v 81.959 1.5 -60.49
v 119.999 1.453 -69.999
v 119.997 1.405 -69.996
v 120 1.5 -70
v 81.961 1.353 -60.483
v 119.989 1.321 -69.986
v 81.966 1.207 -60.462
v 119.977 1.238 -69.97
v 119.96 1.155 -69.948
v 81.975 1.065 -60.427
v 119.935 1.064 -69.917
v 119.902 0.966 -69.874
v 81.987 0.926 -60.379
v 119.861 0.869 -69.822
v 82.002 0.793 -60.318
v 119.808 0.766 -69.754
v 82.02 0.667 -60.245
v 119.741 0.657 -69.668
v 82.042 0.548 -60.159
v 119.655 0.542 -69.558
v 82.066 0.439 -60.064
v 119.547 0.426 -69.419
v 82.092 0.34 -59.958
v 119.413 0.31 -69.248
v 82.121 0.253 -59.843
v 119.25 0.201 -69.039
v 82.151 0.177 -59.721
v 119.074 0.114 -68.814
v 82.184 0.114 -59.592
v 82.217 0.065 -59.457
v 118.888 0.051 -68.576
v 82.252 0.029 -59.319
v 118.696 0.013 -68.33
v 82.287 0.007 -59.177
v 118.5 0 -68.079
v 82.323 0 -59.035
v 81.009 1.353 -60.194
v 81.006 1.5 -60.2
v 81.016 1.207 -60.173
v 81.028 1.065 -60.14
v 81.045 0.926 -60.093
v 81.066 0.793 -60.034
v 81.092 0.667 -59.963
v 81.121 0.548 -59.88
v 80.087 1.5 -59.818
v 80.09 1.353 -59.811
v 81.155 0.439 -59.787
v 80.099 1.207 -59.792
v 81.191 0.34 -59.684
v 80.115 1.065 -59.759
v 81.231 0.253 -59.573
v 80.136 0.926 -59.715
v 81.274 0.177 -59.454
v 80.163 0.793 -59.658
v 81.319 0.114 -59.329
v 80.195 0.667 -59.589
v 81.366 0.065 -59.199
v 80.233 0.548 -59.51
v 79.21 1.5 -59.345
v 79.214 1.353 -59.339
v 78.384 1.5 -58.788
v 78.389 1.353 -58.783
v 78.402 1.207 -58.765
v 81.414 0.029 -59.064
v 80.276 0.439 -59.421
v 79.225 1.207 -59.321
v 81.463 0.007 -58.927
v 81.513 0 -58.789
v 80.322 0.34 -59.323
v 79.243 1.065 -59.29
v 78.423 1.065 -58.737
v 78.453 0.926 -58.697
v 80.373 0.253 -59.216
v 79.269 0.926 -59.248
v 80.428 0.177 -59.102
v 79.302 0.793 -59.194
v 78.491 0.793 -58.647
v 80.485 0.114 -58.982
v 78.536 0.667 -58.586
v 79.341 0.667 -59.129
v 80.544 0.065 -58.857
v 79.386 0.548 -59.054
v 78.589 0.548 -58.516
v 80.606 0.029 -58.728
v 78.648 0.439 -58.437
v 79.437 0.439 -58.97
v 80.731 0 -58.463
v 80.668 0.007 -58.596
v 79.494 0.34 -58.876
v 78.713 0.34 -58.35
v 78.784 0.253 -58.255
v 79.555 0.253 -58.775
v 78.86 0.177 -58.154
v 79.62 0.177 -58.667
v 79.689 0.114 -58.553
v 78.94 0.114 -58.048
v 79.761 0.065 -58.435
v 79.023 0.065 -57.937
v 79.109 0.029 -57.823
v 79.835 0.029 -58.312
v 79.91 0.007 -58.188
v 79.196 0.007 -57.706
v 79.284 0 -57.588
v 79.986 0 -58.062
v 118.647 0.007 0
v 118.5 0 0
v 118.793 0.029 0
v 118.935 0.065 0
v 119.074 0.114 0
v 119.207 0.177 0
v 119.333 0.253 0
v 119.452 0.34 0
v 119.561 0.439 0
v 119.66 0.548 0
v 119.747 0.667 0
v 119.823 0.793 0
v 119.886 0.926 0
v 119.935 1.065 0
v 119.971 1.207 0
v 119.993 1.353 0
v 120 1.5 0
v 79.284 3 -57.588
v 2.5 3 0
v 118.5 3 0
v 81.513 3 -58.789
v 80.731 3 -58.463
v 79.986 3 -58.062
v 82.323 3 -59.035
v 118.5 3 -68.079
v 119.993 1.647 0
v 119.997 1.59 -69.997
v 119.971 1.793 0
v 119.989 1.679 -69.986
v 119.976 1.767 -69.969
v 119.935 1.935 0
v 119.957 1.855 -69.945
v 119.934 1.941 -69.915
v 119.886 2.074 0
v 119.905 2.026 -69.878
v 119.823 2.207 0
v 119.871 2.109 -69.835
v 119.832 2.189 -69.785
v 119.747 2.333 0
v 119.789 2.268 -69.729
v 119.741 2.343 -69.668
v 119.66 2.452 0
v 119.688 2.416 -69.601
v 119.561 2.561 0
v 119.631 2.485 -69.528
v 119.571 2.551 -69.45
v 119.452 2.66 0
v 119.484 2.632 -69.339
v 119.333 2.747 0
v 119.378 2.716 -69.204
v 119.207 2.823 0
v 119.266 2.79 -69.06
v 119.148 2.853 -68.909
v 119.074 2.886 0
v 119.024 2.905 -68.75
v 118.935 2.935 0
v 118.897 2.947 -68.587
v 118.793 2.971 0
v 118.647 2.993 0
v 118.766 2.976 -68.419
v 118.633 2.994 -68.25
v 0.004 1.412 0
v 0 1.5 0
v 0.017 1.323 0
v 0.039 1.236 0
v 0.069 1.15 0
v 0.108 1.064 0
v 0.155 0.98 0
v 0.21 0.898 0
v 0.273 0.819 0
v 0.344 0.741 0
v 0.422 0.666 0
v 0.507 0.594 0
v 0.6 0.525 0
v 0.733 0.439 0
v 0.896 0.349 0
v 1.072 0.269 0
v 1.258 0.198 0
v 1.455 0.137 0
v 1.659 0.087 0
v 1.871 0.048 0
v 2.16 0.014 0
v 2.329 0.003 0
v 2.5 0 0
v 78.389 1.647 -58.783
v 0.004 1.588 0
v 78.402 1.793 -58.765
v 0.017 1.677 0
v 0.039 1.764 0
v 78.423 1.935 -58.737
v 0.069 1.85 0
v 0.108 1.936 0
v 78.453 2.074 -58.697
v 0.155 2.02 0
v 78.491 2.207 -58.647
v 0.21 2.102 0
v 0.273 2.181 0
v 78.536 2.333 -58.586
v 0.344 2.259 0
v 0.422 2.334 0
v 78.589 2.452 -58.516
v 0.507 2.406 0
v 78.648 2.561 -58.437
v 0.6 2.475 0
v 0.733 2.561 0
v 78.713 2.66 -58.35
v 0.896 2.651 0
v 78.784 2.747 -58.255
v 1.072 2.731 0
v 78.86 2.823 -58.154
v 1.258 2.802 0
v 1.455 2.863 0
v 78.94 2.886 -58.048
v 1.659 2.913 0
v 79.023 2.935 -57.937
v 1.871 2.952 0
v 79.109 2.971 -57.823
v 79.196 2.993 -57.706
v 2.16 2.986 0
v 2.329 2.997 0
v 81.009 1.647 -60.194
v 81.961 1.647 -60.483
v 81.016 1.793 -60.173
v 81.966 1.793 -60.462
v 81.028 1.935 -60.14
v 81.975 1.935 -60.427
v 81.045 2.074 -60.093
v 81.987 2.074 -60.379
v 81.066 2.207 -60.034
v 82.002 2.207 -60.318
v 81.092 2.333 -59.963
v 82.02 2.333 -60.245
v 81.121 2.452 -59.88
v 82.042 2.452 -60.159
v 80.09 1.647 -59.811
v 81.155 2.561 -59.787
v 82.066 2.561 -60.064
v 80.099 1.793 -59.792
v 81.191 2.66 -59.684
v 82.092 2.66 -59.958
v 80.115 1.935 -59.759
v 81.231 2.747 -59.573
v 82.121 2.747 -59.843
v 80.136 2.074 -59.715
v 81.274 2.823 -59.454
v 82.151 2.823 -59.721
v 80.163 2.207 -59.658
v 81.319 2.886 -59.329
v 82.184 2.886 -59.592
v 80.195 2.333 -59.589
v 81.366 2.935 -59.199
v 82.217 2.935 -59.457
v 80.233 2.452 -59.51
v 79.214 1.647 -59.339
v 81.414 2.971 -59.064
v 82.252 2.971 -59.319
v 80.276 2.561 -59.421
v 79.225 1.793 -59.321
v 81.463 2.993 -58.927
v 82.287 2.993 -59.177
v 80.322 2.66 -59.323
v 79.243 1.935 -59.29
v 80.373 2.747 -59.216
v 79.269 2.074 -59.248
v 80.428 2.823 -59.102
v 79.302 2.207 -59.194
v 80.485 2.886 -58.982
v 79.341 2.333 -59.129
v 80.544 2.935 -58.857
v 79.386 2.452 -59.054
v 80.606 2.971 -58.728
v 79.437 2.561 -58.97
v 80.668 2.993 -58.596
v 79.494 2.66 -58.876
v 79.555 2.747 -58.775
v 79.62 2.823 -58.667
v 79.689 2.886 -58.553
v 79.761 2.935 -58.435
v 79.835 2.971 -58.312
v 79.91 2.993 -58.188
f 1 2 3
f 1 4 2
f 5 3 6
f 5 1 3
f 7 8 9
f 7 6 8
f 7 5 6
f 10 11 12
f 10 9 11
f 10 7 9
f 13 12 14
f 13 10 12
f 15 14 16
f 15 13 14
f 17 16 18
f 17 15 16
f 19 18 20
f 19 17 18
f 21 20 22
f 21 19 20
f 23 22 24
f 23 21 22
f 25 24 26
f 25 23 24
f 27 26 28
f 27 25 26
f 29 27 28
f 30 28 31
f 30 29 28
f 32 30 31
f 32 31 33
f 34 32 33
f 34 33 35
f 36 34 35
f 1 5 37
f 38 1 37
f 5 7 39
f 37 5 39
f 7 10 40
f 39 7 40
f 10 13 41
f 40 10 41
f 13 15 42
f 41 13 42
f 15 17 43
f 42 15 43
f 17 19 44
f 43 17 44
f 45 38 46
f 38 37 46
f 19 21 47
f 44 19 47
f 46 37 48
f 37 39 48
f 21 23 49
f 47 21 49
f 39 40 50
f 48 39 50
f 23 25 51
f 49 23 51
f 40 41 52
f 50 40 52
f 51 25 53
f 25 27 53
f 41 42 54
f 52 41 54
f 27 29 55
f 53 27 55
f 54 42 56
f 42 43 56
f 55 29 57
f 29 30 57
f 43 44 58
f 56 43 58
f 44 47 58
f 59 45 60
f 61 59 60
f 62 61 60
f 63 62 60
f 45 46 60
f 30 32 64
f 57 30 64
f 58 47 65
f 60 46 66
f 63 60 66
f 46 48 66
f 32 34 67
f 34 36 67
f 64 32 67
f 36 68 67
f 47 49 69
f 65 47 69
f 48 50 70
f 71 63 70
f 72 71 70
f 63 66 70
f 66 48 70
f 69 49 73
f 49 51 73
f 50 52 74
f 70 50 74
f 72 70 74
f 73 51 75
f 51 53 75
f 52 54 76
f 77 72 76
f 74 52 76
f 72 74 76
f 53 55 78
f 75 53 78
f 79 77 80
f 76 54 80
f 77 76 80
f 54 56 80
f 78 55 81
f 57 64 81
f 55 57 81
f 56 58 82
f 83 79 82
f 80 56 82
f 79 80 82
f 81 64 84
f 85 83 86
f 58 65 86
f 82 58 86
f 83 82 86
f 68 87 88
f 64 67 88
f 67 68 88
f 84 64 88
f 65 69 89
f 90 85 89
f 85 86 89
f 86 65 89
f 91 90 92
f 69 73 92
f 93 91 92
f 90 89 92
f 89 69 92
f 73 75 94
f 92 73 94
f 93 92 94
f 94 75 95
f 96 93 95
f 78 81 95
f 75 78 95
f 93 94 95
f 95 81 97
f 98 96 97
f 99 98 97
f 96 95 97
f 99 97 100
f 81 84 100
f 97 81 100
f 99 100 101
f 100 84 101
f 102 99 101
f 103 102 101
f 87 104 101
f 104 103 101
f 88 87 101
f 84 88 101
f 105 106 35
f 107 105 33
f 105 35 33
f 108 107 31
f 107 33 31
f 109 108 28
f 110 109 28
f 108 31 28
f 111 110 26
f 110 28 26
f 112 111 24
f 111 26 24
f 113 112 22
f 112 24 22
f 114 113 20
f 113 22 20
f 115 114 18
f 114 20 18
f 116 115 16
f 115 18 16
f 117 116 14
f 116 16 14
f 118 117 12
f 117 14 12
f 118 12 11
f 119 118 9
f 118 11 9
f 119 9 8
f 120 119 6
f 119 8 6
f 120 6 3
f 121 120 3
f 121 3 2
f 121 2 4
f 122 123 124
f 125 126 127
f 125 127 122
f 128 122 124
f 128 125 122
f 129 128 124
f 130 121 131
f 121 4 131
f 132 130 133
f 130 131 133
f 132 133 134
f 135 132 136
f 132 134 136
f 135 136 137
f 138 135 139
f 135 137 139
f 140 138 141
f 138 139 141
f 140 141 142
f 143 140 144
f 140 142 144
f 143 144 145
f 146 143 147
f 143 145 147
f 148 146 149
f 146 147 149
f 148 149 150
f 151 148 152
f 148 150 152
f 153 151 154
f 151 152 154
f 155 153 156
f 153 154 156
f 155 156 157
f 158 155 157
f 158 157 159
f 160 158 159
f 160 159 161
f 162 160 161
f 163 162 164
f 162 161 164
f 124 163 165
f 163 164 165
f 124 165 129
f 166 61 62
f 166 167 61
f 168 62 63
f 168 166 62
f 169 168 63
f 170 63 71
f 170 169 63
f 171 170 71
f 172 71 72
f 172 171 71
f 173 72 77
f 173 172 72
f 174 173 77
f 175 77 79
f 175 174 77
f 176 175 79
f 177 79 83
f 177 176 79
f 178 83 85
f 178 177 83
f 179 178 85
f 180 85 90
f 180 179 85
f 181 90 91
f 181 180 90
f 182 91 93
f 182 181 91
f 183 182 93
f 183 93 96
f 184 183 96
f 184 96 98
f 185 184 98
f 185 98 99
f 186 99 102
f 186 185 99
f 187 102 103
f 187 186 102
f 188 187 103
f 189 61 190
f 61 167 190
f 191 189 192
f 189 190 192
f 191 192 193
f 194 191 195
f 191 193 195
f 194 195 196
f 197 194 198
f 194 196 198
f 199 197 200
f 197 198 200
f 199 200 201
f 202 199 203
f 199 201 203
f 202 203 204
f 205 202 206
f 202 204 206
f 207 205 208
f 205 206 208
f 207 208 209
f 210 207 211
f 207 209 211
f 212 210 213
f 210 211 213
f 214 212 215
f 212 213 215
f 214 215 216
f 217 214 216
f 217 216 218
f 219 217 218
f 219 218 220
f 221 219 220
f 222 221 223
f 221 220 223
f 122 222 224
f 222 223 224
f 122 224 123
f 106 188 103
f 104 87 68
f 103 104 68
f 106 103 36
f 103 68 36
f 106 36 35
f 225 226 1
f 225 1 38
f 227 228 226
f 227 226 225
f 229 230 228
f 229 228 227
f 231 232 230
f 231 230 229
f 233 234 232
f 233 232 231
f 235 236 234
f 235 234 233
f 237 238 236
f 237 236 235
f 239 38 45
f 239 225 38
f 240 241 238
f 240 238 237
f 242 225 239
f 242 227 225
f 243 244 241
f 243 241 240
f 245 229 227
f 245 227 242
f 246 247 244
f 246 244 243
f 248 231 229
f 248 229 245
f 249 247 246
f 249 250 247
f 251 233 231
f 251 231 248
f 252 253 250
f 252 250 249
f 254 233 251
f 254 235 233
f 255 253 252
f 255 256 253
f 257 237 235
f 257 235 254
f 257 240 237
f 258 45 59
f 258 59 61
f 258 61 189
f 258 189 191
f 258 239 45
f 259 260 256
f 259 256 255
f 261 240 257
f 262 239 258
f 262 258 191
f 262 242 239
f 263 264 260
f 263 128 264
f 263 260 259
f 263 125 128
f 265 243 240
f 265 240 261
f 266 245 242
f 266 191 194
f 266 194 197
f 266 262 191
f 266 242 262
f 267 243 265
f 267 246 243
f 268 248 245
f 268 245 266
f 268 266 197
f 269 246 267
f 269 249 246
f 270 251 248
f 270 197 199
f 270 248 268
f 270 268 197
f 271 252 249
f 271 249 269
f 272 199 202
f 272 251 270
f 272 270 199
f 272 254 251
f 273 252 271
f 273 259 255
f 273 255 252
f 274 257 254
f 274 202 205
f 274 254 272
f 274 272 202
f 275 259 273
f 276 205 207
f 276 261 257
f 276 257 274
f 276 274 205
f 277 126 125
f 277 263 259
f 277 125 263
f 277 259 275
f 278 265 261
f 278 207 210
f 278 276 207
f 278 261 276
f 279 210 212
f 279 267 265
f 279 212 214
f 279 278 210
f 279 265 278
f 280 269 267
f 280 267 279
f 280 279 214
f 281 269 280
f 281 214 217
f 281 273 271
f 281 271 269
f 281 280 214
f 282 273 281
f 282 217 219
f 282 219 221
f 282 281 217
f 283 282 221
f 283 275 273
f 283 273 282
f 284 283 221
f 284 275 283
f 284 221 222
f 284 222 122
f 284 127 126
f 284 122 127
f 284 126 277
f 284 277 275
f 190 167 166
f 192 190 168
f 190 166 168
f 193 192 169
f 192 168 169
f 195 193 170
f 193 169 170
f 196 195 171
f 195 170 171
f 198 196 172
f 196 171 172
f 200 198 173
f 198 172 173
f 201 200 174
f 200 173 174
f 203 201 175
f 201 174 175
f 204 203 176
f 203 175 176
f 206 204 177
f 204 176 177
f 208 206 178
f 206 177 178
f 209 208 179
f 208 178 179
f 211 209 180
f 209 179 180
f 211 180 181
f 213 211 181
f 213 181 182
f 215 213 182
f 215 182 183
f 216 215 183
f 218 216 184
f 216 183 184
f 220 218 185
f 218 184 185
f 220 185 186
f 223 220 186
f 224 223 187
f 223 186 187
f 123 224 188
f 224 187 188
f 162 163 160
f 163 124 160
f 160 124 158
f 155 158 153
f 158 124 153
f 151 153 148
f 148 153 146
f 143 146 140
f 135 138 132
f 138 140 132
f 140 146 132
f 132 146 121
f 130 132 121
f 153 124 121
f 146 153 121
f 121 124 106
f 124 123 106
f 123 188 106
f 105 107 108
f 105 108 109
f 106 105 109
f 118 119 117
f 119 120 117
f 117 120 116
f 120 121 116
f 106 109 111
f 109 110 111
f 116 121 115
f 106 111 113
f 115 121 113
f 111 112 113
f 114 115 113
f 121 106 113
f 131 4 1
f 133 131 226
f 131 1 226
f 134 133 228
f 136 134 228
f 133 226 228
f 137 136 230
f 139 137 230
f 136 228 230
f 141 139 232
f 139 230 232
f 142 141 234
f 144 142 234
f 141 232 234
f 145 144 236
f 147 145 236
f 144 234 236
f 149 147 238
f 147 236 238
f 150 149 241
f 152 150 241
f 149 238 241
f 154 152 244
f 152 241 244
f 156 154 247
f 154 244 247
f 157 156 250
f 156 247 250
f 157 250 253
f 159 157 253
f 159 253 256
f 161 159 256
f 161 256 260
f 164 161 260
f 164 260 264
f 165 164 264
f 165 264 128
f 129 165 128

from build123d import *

# Parameters (mm, degrees)
BOSS_EXTRUDE1_DEPTH = 3
FILLET2_R           = 10
FILLET1_R           = 1.5


with BuildPart() as part:
    # Sketch1 → Boss-Extrude1 (new body)
    with BuildSketch(Plane(origin=(0, 0, 0), x_dir=(1, 0, 0), z_dir=(0, 1, 0))):
        Polygon((0, 0), (120, 0), (120, 70), (80, 60), align=None)
    extrude(amount=BOSS_EXTRUDE1_DEPTH)

    # Fillet2
    fillet2_edges = [part.edges().sort_by_distance(p)[0] for p in [
        (80, 1.5, -60),
    ]]
    fillet(fillet2_edges, radius=FILLET2_R)

    # Fillet1
    fillet1_edges = [part.edges().sort_by_distance(p)[0] for p in [
        (120, 3, -35),
        (120, 0, -35),
        (100.979557811, 3, -65.244889453),
        (100.979557811, 0, -65.244889453),
        (39.192235936, 0, -29.394176952),
        (39.192235936, 3, -29.394176952),
        (80.086755182, 0, -59.817729921),
        (80.086755182, 3, -59.817729921),
    ]]
    fillet(fillet1_edges, radius=FILLET1_R - 0.0001)  # a hair under: the kernel refuses the full size


solid = part.part
